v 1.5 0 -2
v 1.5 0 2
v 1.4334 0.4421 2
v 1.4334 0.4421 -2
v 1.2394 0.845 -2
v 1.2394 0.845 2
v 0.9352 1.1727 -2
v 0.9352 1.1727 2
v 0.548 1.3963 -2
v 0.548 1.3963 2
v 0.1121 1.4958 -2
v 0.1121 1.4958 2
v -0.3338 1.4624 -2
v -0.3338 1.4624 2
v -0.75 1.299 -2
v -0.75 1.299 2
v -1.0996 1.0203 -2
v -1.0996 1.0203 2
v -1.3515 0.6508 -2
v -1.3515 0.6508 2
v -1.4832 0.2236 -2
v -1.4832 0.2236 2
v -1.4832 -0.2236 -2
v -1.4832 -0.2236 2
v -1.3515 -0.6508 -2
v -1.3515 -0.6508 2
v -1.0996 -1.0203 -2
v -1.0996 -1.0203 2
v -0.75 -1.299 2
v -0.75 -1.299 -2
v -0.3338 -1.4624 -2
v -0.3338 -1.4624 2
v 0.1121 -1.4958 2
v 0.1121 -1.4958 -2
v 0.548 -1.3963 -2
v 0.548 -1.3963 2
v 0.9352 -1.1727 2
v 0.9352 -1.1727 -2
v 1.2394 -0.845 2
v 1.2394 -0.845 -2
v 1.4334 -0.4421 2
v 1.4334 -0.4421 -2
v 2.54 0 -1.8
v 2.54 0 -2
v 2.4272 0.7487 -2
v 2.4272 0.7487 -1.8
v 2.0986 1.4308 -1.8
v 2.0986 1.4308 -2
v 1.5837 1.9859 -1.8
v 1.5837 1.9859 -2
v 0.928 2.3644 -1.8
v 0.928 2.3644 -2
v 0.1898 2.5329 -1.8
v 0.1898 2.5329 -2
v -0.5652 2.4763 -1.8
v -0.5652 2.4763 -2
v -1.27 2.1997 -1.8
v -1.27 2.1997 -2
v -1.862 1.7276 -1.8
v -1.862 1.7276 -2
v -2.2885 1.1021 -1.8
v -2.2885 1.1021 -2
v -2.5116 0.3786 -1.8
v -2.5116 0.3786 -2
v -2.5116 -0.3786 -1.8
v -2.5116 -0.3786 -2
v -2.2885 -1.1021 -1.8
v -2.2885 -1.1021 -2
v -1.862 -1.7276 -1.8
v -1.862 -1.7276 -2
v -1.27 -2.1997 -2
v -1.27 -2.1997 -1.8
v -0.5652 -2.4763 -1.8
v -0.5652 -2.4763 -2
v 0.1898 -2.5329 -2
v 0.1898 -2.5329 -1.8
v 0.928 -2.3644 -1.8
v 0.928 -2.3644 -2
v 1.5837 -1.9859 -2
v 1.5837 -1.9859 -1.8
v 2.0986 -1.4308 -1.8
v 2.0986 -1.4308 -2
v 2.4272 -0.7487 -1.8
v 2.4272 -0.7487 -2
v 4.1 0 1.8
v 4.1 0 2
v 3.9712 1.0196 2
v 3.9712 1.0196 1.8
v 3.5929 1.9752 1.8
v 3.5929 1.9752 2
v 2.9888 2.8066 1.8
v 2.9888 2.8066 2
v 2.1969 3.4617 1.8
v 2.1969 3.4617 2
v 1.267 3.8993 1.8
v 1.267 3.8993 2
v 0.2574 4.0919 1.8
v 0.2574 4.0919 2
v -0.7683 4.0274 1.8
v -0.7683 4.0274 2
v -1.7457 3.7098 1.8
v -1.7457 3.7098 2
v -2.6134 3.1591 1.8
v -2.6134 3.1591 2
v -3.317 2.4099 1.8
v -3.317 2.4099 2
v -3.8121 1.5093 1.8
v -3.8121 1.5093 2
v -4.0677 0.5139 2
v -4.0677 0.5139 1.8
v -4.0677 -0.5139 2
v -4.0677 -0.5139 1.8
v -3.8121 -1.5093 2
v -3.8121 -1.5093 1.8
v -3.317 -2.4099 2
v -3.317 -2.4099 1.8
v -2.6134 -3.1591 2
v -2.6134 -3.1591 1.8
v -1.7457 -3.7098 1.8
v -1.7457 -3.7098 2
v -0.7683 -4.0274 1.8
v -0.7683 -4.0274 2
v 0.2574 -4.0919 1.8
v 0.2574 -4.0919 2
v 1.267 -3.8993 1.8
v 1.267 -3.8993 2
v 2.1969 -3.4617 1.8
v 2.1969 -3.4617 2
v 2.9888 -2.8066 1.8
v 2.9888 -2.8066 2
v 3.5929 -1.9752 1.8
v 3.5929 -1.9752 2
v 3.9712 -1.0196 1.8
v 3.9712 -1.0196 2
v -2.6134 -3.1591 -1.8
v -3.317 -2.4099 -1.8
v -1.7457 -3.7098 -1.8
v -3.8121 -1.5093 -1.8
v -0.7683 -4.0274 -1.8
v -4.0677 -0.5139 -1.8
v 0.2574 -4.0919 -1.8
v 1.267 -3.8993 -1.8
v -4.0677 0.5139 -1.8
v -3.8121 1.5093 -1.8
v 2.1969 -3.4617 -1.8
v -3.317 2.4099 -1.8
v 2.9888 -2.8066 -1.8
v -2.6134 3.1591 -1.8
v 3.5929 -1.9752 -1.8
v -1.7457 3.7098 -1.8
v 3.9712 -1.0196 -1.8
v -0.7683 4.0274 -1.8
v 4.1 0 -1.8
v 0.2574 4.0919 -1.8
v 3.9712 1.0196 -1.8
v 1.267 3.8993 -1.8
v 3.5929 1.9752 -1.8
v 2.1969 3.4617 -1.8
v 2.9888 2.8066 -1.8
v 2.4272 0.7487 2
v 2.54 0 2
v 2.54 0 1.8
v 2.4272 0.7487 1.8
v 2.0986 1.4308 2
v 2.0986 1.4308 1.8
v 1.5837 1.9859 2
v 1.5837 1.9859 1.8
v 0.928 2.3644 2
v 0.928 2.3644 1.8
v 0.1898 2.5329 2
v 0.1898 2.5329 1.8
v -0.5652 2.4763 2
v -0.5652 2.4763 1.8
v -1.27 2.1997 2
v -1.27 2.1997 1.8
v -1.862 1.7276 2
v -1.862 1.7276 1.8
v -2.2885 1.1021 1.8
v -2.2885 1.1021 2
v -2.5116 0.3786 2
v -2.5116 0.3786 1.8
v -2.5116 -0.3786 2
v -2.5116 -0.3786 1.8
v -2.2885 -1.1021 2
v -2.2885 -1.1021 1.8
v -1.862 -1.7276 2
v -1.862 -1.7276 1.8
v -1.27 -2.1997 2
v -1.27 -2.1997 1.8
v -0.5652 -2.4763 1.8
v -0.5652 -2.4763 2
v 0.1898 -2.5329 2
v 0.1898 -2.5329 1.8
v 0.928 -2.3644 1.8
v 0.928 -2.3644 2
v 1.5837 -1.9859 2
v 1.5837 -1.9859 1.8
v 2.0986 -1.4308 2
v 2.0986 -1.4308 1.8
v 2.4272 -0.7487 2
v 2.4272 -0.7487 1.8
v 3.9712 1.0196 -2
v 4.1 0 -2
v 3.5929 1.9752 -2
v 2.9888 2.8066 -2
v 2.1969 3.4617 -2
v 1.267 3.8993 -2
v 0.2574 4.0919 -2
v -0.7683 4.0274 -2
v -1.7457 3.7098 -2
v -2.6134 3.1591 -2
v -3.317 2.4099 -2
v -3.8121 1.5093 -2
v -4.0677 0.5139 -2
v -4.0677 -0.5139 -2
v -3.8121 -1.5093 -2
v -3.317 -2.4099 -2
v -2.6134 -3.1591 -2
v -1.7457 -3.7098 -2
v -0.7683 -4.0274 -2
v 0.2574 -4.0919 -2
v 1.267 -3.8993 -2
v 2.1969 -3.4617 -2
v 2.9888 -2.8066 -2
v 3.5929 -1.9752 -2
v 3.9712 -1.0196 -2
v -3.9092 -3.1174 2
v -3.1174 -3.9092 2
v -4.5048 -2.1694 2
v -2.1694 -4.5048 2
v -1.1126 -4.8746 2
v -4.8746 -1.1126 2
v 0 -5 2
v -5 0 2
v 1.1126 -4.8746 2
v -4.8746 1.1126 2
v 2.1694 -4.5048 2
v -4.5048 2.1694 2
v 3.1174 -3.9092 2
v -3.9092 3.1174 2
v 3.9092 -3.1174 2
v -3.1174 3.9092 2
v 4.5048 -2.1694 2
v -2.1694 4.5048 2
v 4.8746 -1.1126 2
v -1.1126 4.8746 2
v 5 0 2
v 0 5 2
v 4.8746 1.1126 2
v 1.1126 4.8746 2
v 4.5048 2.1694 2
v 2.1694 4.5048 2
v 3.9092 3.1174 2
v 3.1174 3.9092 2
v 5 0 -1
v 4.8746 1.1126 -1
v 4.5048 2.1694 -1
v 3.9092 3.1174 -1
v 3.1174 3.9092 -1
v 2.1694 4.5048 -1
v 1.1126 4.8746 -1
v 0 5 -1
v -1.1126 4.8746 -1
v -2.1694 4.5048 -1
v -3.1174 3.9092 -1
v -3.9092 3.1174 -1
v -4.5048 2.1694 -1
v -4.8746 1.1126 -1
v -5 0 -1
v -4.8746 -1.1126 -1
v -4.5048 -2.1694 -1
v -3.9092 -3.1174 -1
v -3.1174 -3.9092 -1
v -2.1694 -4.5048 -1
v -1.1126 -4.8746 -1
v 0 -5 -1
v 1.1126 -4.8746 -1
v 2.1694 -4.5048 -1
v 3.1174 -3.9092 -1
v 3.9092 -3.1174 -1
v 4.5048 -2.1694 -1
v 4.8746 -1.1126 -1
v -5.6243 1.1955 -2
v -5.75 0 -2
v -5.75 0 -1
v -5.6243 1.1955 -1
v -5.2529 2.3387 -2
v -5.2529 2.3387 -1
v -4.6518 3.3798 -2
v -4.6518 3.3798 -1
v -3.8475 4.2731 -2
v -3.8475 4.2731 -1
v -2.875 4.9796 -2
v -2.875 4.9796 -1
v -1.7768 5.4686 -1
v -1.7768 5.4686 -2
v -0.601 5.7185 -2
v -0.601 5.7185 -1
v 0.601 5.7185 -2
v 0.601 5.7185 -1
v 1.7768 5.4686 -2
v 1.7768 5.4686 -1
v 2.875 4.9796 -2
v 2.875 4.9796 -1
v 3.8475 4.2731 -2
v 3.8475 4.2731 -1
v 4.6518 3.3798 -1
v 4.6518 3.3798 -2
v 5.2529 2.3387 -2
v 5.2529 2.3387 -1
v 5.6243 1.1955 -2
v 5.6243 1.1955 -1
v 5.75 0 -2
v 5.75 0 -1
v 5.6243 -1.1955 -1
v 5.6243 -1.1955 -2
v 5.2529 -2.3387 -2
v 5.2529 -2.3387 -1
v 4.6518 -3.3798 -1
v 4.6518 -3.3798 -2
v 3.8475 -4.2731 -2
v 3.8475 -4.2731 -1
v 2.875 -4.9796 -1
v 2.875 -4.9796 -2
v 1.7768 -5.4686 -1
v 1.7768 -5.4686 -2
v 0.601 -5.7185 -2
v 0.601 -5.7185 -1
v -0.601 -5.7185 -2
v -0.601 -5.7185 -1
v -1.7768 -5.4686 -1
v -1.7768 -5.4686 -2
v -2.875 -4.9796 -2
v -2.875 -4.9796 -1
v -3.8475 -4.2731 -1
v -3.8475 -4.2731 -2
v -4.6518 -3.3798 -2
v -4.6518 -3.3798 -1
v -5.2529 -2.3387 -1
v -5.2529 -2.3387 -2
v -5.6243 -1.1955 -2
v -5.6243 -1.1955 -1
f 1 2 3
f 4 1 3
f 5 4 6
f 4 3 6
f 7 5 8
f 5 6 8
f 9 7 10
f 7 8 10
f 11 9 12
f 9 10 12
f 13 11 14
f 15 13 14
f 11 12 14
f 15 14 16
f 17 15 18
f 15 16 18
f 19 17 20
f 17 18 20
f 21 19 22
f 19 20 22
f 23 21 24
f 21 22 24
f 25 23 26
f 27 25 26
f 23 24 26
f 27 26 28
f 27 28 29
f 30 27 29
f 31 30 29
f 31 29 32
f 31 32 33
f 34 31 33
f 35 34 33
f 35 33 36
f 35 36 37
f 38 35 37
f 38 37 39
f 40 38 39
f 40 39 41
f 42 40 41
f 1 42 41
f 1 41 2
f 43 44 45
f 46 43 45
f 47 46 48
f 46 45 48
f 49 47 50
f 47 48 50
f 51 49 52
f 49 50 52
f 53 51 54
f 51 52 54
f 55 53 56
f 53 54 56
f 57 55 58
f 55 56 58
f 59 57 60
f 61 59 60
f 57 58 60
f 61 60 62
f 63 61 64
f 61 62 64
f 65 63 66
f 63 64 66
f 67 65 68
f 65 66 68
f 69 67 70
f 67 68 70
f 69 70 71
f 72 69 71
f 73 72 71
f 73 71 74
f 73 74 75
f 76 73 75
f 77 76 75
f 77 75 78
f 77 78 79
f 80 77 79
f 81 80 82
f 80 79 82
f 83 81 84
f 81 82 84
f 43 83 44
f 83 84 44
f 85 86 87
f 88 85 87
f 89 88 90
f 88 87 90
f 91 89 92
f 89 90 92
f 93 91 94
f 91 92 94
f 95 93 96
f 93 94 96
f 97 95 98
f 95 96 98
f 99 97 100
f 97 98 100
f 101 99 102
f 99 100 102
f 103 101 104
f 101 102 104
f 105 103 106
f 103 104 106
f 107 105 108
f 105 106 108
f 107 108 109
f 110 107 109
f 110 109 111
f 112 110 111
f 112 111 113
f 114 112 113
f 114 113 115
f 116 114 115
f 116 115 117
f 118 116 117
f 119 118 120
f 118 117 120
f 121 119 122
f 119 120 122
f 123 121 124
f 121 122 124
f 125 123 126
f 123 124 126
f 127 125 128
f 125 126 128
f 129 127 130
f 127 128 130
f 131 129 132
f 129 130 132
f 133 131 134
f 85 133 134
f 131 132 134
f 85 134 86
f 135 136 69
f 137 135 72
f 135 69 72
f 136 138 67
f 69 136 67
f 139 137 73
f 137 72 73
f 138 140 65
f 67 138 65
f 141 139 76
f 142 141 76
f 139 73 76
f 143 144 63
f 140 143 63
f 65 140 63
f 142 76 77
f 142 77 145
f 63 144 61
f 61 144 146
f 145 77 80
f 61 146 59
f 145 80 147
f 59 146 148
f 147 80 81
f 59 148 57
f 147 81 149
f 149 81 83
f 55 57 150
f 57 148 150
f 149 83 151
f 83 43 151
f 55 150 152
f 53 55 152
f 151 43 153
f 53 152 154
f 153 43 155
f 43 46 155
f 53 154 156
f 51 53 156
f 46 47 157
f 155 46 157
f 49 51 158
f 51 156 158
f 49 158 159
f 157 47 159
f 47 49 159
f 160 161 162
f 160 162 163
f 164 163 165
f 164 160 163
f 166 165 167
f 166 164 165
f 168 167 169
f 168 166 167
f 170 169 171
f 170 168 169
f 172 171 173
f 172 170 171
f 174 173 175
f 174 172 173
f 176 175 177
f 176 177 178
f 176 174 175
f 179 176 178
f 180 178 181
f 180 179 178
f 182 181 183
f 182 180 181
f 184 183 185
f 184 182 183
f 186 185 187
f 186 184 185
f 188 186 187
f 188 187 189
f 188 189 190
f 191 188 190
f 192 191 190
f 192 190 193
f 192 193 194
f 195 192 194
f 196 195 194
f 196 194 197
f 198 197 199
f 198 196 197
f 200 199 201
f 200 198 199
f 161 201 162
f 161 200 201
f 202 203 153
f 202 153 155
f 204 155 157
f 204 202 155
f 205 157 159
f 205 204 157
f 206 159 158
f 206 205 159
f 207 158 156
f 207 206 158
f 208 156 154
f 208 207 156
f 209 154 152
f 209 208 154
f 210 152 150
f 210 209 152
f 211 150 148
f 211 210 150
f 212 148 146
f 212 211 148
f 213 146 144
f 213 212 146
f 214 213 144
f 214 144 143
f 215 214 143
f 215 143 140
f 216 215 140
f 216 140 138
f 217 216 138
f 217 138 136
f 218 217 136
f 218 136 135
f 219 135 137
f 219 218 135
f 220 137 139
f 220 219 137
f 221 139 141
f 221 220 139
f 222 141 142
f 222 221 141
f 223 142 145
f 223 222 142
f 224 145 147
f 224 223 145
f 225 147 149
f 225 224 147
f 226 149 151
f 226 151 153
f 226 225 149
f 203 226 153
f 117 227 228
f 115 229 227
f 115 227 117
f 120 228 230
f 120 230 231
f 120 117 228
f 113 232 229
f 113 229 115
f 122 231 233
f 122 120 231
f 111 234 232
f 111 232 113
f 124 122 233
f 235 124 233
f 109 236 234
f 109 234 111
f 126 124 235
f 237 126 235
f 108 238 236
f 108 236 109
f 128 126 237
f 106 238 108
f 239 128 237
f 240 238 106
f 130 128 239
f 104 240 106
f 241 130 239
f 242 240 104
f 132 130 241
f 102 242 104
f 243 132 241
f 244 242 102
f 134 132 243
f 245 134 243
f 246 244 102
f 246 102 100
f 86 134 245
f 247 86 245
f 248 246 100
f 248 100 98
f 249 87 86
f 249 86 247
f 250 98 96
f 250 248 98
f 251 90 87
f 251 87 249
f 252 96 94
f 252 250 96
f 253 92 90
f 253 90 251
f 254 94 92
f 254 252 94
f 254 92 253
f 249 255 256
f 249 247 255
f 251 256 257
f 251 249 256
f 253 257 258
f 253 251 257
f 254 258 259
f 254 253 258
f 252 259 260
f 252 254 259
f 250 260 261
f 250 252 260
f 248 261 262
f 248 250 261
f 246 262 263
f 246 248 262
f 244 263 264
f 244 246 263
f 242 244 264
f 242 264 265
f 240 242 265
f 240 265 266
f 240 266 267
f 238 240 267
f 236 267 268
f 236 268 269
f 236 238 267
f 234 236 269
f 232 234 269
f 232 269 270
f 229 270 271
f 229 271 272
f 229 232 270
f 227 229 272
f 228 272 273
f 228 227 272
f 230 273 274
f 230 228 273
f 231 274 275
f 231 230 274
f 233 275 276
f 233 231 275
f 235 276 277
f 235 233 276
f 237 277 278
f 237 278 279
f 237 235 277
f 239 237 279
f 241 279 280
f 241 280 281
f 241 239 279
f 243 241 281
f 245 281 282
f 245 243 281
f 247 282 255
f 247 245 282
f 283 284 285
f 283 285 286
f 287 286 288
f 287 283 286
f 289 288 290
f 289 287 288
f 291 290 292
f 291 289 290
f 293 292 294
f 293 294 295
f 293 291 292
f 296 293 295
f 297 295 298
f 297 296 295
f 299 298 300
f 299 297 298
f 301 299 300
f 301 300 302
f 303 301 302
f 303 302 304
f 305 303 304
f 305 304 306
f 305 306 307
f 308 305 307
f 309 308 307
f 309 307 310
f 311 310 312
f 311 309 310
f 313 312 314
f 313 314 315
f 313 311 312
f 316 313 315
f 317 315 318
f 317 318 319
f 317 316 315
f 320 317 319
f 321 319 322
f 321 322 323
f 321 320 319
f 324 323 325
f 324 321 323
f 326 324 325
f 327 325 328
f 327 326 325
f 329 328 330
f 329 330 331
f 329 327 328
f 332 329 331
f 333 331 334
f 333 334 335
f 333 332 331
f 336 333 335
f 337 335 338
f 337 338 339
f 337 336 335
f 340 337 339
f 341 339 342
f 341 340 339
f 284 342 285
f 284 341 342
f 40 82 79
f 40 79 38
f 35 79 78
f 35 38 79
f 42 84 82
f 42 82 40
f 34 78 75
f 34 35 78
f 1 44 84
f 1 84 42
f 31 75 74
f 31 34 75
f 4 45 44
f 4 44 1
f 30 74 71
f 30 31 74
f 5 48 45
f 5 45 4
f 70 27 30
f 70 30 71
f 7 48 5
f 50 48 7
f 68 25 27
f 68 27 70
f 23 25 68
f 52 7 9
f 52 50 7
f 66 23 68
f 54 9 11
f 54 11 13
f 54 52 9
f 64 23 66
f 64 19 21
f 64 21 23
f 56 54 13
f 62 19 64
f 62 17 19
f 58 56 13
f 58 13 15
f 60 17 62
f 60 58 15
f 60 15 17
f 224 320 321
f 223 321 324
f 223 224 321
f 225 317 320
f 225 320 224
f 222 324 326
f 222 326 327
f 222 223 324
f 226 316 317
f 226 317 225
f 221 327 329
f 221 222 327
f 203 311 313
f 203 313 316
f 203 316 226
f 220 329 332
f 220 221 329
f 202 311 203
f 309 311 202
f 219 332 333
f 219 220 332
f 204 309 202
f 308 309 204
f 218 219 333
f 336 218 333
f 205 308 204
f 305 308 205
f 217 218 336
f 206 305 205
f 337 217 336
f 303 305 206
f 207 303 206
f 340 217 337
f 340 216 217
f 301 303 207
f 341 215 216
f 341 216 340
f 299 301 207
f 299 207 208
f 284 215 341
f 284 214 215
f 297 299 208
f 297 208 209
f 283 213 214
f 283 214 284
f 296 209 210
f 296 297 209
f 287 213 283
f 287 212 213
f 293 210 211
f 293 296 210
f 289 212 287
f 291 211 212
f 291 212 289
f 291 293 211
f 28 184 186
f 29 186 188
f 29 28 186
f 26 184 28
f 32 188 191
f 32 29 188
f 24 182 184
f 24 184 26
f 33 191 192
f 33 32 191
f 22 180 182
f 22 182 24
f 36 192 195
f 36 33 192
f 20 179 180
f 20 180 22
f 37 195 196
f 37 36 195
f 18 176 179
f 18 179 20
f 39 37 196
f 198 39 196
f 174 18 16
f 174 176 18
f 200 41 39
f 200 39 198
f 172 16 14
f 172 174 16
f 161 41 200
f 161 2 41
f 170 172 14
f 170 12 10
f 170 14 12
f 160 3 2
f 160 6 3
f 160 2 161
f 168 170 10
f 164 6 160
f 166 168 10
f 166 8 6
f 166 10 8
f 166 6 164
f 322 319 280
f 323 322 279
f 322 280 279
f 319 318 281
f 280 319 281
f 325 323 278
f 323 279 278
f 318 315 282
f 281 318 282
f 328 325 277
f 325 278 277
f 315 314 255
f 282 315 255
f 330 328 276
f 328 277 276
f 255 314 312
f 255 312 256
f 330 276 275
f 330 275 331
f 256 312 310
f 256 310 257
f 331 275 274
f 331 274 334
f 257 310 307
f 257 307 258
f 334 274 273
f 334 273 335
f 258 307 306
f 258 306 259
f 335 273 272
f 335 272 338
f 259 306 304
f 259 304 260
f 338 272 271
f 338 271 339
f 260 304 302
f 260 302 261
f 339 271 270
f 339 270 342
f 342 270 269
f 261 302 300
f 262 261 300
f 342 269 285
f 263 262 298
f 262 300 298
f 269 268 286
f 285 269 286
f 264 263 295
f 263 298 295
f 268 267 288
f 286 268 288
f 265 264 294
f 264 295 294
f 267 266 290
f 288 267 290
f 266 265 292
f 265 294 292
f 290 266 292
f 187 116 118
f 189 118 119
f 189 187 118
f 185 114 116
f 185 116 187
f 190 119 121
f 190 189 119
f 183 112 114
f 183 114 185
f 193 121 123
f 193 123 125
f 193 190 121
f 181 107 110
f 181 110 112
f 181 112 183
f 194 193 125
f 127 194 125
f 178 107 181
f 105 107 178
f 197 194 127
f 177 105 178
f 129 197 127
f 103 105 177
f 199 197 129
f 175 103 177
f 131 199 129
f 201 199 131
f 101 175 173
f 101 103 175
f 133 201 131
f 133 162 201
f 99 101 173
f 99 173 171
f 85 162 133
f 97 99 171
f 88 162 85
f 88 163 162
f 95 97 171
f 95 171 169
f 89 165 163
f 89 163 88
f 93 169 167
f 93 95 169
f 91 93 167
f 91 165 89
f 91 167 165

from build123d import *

# Parameters (mm, degrees)
SKETCH_1_R          = 5
EXTRUDE_1_DEPTH     = 2
SKETCH_4_R          = 5.75
EXTRUDE_2_DEPTH     = 1
SKETCH_2_R          = 1.5
CUT_EXTRUDE_1_DEPTH = 5
SKETCH_3_R          = 4.1
SKETCH_3_R_2        = 2.54
CUT_EXTRUDE_2_DEPTH = 0.2


with BuildPart() as part:
    # 草圖1 → 填料-伸長1 (new body, symmetric)
    with BuildSketch(Plane.XY):
        Circle(SKETCH_1_R)
    extrude(amount=EXTRUDE_1_DEPTH, both=True)

    # 草圖4 → 填料-伸長2 (add)
    with BuildSketch(Plane(origin=(0, 0, -2), x_dir=(-1, 0, 0), z_dir=(0, 0, -1))):
        Circle(SKETCH_4_R)
    extrude(amount=-EXTRUDE_2_DEPTH)

    # 草圖2 → 除料-伸長1 (cut, through all)
    with BuildSketch(Plane.XY.offset(2)):
        Circle(SKETCH_2_R)
    extrude(amount=-CUT_EXTRUDE_1_DEPTH, mode=Mode.SUBTRACT)

    # 草圖3 → 除料-伸長2 (cut)
    with BuildSketch(Plane.XY.offset(2)):
        Circle(SKETCH_3_R)
        Circle(SKETCH_3_R_2, mode=Mode.SUBTRACT)
    cut_extrude_2 = extrude(amount=-CUT_EXTRUDE_2_DEPTH, mode=Mode.SUBTRACT)

    # 鏡射1: 除料-伸長2 across plane
    add(cut_extrude_2.mirror(Plane.XY), mode=Mode.SUBTRACT)


solid = part.part
